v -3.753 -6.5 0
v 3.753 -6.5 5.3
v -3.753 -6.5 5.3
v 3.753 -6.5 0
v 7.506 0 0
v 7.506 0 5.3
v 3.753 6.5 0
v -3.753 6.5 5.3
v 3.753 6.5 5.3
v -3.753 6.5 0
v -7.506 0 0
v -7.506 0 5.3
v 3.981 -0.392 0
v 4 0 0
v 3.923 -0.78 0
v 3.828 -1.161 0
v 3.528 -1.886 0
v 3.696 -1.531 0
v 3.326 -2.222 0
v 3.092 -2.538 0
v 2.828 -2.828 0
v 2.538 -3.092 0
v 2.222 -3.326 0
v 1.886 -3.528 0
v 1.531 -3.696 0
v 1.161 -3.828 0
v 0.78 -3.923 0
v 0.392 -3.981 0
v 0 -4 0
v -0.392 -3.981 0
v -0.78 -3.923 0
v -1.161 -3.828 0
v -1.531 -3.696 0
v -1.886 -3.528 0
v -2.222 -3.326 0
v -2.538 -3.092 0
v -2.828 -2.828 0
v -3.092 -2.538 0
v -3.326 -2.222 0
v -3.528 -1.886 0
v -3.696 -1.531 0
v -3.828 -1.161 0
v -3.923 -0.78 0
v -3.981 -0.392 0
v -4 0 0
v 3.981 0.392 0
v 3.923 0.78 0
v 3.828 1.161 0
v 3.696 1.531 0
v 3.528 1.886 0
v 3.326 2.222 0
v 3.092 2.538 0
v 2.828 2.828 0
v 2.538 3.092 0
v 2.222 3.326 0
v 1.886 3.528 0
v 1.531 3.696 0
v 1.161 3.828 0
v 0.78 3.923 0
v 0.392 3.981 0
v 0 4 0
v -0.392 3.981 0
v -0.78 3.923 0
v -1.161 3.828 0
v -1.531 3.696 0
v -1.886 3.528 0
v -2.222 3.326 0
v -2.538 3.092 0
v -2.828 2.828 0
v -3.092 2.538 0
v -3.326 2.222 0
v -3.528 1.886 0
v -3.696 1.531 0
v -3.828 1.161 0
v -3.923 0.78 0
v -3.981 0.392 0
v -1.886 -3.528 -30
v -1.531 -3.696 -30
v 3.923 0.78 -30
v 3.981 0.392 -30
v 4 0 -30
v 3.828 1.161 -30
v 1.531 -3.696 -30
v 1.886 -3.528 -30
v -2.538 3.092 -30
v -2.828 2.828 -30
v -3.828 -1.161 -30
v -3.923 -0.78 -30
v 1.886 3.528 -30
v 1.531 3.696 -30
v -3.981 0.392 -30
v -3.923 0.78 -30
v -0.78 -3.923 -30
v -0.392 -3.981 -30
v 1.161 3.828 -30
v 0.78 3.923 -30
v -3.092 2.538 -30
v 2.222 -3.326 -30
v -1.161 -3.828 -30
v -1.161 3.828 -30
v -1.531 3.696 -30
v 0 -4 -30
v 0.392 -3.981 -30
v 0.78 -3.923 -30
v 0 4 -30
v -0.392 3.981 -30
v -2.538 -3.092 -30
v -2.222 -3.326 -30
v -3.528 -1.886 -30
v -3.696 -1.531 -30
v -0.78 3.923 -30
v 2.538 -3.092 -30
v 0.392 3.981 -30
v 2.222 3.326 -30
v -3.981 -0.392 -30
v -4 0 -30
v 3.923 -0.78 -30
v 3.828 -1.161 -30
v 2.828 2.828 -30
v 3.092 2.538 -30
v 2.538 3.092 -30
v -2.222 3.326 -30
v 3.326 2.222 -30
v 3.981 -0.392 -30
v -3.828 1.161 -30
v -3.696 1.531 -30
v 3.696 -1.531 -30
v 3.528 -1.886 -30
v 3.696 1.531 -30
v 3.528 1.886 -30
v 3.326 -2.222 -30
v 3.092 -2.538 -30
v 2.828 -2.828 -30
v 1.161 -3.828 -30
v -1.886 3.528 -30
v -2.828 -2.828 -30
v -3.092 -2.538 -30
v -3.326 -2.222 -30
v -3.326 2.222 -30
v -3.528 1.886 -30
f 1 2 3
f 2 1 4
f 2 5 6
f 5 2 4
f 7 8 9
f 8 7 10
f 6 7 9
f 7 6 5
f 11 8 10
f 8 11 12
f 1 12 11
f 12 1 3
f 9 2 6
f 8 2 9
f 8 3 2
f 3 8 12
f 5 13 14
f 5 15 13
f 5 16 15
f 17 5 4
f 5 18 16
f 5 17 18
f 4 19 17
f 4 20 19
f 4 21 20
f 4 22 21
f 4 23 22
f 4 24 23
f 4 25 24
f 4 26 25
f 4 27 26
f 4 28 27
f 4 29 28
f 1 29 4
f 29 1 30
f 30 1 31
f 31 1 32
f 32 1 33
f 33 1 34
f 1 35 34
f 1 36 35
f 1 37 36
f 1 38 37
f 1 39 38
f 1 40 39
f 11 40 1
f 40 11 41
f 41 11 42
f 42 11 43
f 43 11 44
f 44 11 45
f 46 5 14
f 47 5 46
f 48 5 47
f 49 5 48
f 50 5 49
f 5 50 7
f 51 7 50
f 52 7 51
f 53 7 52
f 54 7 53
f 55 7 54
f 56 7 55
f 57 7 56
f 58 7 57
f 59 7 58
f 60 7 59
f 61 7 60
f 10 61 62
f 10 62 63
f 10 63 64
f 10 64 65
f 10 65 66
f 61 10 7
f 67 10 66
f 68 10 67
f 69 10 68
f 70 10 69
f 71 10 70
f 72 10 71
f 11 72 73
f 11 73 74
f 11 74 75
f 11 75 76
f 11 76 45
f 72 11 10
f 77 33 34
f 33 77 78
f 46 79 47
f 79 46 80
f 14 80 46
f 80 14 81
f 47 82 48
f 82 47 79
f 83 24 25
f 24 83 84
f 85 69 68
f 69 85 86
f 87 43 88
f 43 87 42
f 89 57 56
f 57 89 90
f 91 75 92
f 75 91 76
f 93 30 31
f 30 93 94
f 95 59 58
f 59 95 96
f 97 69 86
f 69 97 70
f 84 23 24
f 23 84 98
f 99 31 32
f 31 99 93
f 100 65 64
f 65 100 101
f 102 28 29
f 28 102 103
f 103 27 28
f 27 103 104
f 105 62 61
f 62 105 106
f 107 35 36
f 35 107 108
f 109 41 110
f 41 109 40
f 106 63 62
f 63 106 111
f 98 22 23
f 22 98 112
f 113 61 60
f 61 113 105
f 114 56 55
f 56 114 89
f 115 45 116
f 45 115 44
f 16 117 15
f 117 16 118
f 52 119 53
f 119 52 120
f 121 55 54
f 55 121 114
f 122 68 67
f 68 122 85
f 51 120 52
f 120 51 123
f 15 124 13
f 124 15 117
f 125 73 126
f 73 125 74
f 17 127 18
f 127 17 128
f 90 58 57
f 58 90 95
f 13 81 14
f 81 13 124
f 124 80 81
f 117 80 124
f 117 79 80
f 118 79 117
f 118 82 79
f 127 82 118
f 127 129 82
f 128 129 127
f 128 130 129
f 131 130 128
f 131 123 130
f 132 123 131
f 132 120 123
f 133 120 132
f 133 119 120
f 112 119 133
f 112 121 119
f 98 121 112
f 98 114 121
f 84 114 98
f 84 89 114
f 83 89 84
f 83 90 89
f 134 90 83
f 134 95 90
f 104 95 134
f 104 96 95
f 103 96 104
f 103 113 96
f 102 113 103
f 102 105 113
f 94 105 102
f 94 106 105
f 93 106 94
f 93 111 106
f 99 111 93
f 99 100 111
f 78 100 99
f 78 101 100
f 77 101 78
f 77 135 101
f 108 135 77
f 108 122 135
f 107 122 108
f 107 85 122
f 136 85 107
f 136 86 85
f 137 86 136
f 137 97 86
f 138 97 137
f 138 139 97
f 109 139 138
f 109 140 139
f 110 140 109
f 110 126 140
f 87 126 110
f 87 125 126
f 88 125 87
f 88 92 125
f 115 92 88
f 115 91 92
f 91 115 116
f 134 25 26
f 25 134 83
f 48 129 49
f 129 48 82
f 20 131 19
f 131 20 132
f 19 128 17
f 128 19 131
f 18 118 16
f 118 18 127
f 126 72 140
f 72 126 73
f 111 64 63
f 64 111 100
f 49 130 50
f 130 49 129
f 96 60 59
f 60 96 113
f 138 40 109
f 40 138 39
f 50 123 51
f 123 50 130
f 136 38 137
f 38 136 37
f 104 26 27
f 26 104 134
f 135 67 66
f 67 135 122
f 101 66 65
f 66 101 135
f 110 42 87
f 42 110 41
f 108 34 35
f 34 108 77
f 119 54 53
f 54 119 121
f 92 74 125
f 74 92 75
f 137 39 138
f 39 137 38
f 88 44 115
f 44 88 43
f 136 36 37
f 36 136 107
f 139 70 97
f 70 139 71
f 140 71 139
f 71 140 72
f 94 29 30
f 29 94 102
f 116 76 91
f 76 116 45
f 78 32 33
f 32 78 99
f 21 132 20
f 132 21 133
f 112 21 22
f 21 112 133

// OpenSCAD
// M8 六角ボルト（ねじ山省略、シャンクは円柱）
// 頭部底面が z=0、シャンクは z<0 側へ伸ばす

// 寸法（mm）
af = 13;             // 対辺距離 (across-flats)
head_h = 5.3;        // 頭部高さ
shank_d = 8;         // シャンク直径
shank_len = 30;      // シャンク長さ

// 六角柱用の外接円直径（円周上の頂点間の直径）
head_d = 2 * af / sqrt(3);

union() {
    // 六角頭部（底面が z=0）
    cylinder(h = head_h, d = head_d, $fn = 6, center = false);

    // シャンク（z=-shank_len .. 0）
    translate([0, 0, -shank_len])
        cylinder(h = shank_len, d = shank_d, $fn = 64, center = false);
}
